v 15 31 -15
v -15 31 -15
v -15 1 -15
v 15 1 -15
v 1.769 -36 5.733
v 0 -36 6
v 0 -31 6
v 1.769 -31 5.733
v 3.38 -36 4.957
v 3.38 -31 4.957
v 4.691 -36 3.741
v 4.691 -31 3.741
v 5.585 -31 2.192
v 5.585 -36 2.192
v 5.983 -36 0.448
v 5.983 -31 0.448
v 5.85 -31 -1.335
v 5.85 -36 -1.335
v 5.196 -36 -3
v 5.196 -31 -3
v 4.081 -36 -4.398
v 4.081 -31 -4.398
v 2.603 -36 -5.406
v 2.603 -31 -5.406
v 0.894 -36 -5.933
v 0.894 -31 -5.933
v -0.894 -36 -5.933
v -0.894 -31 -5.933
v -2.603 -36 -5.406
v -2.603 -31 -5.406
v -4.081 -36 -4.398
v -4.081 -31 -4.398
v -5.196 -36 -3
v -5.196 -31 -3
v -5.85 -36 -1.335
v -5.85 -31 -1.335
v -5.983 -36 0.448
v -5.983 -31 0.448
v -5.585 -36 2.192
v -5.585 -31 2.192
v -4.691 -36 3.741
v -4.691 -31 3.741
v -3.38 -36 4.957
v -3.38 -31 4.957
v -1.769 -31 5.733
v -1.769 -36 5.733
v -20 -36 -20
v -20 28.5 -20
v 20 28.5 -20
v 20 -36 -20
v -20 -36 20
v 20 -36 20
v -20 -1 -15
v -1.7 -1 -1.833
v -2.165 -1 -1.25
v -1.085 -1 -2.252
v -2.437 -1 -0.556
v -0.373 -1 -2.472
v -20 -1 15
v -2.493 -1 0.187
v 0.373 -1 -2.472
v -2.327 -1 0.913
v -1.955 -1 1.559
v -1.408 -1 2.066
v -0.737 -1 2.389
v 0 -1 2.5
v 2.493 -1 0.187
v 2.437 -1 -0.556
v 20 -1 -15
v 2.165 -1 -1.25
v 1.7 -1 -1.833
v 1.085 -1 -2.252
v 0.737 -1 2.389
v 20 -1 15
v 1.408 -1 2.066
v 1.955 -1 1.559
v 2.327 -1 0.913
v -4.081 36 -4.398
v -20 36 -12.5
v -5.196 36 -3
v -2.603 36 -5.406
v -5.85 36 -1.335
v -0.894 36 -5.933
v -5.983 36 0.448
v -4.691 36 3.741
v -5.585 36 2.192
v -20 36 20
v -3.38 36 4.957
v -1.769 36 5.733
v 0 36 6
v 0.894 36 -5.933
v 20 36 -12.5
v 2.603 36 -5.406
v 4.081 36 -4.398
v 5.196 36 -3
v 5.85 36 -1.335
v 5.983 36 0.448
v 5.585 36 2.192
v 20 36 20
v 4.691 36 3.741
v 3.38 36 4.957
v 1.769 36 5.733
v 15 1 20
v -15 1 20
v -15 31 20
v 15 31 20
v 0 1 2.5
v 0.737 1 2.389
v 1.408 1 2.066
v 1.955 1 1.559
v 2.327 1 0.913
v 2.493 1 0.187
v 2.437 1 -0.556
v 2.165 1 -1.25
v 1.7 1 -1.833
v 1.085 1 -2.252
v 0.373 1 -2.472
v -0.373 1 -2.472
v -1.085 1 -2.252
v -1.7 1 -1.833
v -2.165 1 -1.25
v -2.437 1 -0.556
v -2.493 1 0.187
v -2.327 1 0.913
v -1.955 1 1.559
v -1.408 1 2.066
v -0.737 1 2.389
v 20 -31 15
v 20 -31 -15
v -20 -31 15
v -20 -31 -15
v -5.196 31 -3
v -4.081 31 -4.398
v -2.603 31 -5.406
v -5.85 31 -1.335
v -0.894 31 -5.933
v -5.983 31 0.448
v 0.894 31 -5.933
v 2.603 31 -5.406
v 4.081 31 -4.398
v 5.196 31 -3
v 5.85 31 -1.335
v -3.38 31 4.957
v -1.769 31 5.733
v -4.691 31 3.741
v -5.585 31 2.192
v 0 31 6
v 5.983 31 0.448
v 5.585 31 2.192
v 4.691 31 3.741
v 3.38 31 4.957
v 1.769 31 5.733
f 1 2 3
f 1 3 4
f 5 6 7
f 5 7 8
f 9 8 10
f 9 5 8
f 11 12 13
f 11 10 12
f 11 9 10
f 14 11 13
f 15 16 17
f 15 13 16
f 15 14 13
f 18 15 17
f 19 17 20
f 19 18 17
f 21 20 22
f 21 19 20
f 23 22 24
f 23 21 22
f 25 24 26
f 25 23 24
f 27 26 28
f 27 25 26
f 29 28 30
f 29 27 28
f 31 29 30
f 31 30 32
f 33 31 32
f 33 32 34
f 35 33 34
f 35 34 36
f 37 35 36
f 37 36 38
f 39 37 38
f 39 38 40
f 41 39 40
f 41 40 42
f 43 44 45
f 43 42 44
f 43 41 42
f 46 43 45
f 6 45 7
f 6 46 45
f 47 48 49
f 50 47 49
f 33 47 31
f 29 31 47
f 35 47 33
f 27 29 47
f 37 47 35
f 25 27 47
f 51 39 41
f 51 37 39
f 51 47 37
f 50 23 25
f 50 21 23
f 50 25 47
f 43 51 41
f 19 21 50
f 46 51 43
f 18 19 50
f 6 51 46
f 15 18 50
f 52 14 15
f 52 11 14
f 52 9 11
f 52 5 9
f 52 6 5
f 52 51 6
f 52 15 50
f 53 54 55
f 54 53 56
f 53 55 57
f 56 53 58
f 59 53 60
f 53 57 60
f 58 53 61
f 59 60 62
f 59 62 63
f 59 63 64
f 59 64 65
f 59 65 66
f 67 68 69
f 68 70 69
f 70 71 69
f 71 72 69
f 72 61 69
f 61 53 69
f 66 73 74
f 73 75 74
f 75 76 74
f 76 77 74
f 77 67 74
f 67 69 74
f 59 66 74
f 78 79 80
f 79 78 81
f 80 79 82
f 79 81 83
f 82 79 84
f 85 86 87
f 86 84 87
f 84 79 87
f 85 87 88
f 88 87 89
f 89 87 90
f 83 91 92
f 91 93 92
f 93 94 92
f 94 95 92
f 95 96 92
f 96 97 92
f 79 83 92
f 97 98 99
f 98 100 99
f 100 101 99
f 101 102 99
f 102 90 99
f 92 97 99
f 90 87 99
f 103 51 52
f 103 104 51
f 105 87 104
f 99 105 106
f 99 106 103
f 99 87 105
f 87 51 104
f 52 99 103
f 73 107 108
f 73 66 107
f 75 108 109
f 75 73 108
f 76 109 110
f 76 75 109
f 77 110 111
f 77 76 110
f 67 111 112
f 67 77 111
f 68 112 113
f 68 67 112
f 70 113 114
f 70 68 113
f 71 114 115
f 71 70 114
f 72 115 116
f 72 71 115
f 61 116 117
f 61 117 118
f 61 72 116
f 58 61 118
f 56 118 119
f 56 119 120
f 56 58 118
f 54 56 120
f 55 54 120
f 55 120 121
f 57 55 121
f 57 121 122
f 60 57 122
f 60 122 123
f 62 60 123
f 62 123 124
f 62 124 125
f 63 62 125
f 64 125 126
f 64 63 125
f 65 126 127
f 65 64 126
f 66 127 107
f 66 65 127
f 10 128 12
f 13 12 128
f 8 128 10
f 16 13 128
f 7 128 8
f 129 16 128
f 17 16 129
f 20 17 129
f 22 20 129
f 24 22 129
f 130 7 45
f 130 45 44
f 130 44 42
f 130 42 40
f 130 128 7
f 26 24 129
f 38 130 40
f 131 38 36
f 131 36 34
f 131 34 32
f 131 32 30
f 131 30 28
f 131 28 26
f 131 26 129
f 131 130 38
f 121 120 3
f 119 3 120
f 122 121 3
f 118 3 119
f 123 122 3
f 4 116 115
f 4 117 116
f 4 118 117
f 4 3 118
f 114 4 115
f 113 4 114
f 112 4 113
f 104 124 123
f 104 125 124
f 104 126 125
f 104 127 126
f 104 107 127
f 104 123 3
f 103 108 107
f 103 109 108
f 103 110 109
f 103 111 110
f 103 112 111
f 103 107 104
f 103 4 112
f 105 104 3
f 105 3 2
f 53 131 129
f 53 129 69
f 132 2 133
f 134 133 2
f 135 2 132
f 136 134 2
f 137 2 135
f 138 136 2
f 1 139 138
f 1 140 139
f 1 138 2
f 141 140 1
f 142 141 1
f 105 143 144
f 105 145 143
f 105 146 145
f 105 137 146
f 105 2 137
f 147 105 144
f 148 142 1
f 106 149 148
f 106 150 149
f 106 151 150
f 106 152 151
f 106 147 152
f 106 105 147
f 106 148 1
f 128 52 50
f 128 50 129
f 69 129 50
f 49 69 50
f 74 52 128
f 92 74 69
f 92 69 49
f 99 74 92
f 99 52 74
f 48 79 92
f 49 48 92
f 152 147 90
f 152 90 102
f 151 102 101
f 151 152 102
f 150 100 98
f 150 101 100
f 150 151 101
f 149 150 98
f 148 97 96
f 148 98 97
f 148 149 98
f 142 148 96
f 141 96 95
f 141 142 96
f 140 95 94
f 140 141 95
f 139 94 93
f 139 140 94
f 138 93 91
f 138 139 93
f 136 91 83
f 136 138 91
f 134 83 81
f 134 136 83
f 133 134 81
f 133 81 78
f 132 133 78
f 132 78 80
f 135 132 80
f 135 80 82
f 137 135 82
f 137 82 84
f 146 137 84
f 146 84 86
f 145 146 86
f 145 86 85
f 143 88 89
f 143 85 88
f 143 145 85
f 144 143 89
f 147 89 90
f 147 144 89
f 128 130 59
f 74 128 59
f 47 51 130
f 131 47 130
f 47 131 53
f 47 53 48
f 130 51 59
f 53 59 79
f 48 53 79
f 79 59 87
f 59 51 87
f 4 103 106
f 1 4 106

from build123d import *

# Parameters (mm, degrees)
SKETCH2_W               = 40
SKETCH2_H               = 72
BOSS_EXTRUDE1_DEPTH     = 20
SKETCH3_W               = 30
SKETCH3_H               = 30
CUT_EXTRUDE1_DEPTH      = 35
CUT_EXTRUDE2_DEPTH      = 46.782092569
CUT_EXTRUDE2_DEPTH_BACK = 46.782092569
SKETCH4_W               = 30
SKETCH4_H               = 30
CHAMFER1_SIZE           = 7.5
CUT_EXTRUDE3_DEPTH      = 46.782092569
CUT_EXTRUDE3_DEPTH_BACK = 46.782092569
SKETCH5_R               = 6
SKETCH6_R               = 6
SKETCH6_R_2             = 2.5
BOSS_EXTRUDE2_DEPTH     = 1


with BuildPart() as part:
    # Sketch2 → Boss-Extrude1 (new, symmetric)
    with BuildSketch(Plane.XY):
        Rectangle(SKETCH2_W, SKETCH2_H)
    extrude(amount=BOSS_EXTRUDE1_DEPTH, both=True)

    # Sketch3 → Cut-Extrude1 (cut)
    with BuildSketch(Plane.XY.offset(20)):
        with Locations((0, 16)):
            Rectangle(SKETCH3_W, SKETCH3_H)
    extrude(amount=-CUT_EXTRUDE1_DEPTH, mode=Mode.SUBTRACT)

    # Sketch4 → Cut-Extrude2 (cut, two sides: drawn at the far end of the back side and taken through both)
    with BuildSketch(Plane(origin=(0, 0, 0), x_dir=(0, 0, -1), z_dir=(1, 0, 0)).offset(-CUT_EXTRUDE2_DEPTH_BACK)):
        with Locations((0, -16)):
            Rectangle(SKETCH4_W, SKETCH4_H)
    extrude(amount=CUT_EXTRUDE2_DEPTH + CUT_EXTRUDE2_DEPTH_BACK, mode=Mode.SUBTRACT)

    # Chamfer1
    chamfer1_edges = [part.edges().sort_by_distance(p)[0] for p in [
        (0, 36, -20),
    ]]
    chamfer(chamfer1_edges, length=CHAMFER1_SIZE)

    # Sketch5 → Cut-Extrude3 (cut, two sides: drawn at the far end of the back side and taken through both)
    with BuildSketch(Plane(origin=(0, 0, 0), x_dir=(1, 0, 0), z_dir=(0, 1, 0)).offset(-CUT_EXTRUDE3_DEPTH_BACK)):
        with Locations(Location((0, 0, 0), (0, 0, 270))):
            Circle(SKETCH5_R)
    extrude(amount=CUT_EXTRUDE3_DEPTH + CUT_EXTRUDE3_DEPTH_BACK, mode=Mode.SUBTRACT)

    # Sketch6 → Boss-Extrude2 (add, symmetric)
    with BuildSketch(Plane(origin=(0, 0, 0), x_dir=(1, 0, 0), z_dir=(0, 1, 0))):
        with Locations(Location((0, 0, 0), (0, 0, 270))):
            Circle(SKETCH6_R)
        with Locations(Location((0, 0, 0), (0, 0, 270))):
            Circle(SKETCH6_R_2, mode=Mode.SUBTRACT)
    extrude(amount=BOSS_EXTRUDE2_DEPTH, both=True)


solid = part.part
